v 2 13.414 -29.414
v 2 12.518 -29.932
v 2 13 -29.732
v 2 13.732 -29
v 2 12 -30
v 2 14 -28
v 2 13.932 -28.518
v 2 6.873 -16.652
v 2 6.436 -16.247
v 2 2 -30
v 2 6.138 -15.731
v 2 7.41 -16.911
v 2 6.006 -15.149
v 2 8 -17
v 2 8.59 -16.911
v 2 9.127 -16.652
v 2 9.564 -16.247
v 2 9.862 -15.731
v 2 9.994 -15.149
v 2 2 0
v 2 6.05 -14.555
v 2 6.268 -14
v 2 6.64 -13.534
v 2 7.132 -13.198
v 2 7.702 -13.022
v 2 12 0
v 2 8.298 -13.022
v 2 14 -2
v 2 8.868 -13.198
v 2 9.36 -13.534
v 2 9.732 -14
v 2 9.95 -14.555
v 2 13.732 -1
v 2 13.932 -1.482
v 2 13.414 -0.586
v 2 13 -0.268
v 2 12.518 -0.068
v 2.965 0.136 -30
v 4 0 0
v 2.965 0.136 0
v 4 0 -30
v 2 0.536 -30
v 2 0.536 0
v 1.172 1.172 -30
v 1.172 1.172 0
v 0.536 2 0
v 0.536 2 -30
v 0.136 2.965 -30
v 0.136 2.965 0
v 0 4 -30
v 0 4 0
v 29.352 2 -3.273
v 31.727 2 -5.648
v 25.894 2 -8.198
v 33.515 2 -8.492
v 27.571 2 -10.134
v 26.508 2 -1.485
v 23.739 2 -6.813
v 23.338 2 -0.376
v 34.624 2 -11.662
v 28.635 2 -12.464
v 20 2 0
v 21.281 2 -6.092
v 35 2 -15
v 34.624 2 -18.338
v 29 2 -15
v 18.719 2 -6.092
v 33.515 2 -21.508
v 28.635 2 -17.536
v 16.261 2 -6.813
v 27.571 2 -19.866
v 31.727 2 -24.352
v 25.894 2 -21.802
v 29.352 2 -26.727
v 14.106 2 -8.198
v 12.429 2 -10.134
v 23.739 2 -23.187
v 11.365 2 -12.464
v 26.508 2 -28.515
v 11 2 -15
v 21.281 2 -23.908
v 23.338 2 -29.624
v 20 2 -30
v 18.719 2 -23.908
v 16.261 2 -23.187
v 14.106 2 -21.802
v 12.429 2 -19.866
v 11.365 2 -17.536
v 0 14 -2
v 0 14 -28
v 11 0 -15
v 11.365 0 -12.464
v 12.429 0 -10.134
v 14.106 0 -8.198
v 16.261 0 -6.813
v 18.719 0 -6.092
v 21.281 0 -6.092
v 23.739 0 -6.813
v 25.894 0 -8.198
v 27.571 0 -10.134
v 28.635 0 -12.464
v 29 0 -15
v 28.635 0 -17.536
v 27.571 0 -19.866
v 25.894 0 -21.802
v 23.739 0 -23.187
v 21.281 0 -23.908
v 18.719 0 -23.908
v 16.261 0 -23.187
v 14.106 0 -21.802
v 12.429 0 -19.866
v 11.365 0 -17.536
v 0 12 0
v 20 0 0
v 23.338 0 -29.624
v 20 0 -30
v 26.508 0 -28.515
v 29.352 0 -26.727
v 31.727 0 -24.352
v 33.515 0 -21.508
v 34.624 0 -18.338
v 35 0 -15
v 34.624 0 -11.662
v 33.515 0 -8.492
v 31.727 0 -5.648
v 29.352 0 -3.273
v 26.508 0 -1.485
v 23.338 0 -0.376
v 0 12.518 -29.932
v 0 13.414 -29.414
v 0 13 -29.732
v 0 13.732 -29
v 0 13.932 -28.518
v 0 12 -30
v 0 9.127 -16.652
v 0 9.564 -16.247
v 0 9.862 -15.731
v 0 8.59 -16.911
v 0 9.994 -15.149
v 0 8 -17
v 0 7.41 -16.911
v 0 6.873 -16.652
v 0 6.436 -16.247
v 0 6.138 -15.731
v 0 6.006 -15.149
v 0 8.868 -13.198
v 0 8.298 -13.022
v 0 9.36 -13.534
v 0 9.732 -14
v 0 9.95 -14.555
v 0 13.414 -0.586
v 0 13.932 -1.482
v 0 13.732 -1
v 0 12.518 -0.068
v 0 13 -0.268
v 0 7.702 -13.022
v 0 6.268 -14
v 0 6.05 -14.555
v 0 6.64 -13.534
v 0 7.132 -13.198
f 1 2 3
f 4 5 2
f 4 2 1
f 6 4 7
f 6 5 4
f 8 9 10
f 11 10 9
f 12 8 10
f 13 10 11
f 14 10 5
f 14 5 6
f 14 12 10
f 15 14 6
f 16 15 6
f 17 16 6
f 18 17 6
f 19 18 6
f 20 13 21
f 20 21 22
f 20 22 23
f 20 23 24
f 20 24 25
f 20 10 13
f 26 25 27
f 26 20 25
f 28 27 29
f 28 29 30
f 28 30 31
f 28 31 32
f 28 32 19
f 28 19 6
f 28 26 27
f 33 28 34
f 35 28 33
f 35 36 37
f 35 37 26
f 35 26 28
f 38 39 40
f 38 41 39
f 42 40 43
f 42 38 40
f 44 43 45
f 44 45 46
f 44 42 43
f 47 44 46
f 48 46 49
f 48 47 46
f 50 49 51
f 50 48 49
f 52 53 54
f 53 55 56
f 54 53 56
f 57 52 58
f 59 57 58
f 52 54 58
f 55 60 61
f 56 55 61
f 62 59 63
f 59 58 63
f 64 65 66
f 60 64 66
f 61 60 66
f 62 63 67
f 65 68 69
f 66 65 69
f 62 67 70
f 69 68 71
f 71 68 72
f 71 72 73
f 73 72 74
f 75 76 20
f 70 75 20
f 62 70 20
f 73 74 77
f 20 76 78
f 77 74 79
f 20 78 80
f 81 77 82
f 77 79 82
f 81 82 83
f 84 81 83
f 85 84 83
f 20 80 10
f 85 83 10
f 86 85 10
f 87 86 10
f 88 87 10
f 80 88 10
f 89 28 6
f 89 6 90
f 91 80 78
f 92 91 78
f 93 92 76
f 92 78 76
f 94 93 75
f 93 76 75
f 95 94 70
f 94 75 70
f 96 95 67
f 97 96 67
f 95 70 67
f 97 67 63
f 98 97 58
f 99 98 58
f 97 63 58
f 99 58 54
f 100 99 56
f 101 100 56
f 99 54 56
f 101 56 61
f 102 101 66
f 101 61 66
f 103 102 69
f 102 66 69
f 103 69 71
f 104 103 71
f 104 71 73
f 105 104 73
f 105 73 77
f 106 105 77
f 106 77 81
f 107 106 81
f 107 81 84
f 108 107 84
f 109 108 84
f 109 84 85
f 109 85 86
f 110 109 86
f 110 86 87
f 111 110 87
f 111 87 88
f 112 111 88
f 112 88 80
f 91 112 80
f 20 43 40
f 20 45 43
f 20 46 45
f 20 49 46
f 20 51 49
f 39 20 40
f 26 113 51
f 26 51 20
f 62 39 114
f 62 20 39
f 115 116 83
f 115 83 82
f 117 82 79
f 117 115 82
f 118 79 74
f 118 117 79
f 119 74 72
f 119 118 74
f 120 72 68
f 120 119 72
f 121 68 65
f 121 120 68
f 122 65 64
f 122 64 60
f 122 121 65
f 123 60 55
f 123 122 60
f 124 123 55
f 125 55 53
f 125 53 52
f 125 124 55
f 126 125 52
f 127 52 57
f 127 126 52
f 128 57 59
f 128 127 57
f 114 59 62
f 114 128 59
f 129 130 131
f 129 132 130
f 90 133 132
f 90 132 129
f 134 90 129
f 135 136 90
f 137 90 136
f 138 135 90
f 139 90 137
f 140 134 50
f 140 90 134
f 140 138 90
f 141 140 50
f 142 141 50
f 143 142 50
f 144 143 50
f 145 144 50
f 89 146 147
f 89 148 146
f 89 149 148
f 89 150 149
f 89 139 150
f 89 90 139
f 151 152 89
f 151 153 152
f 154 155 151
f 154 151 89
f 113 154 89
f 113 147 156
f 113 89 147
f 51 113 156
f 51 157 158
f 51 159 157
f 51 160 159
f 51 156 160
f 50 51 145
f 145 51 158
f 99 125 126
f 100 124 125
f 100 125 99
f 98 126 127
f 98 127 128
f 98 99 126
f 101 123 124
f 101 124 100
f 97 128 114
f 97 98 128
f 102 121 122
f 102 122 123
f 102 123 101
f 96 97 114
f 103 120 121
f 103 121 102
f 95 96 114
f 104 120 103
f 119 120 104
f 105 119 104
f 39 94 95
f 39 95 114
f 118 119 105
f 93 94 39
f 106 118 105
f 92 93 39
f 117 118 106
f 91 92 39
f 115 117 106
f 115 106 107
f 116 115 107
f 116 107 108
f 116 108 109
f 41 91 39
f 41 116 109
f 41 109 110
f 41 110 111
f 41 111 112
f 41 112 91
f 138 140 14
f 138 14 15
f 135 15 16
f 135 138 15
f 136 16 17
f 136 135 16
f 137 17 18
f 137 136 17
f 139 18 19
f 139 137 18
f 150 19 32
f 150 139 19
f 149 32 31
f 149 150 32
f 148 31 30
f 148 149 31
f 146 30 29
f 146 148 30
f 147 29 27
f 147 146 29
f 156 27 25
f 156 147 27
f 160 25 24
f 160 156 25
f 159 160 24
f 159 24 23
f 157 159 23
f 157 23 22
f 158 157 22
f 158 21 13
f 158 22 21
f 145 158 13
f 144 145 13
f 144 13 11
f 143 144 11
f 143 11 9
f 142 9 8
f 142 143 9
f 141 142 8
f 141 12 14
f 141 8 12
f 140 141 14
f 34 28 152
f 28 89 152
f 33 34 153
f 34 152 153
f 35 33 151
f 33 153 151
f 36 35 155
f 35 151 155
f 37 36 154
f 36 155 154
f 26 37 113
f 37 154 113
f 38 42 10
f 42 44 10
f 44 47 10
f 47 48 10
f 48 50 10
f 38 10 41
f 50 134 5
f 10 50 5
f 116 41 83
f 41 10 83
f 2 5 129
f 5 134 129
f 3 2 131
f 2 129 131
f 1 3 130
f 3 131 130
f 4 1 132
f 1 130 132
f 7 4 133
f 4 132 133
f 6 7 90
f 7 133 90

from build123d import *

# Parameters (mm, degrees)
BOSS_EXTRUDE1_DEPTH     = 30
EXTRUDE_THIN1_DEPTH     = 2
SKETCH3_R               = 9
CUT_EXTRUDE1_DEPTH      = 48.634021455
FILLET2_R               = 4
CUT_EXTRUDE2_DEPTH      = 49.176757882
CUT_EXTRUDE2_DEPTH_BACK = 49.176757882
SKETCH4_R               = 2
FILLET3_R               = 2


with BuildPart() as part:
    # Sketch1 → Boss-Extrude1 (new body)
    with BuildSketch(Plane.XY):
        Polygon((0, 0), (20, 0), (20, 2), (2, 2), (2, 14), (0, 14), align=None)
    extrude(amount=-BOSS_EXTRUDE1_DEPTH)

    # Sketch2 → Extrude-Thin1 (add)
    with BuildSketch(Plane(origin=(0, 0, 0), x_dir=(1, 0, 0), z_dir=(0, 1, 0))):
        with BuildLine():
            ThreePointArc((20, 30), (35, 15), (20, 0))
            Line((20, 0), (20, 10))
            ThreePointArc((20, 10), (25, 15), (20, 20))
            Line((20, 20), (20, 30))
        make_face()
    extrude(amount=EXTRUDE_THIN1_DEPTH)

    # Sketch3 → Cut-Extrude1 (cut, through all)
    with BuildSketch(Plane(origin=(0, 2, 0), x_dir=(1, 0, 0), z_dir=(0, 1, 0))):
        with Locations(Location((20, 15, 0), (0, 0, 180))):
            Circle(SKETCH3_R)
    extrude(amount=-CUT_EXTRUDE1_DEPTH, mode=Mode.SUBTRACT)

    # Fillet2
    fillet2_edges = [part.edges().sort_by_distance(p)[0] for p in [
        (0, 0, -15),
    ]]
    fillet(fillet2_edges, radius=FILLET2_R)

    # Sketch4 → Cut-Extrude2 (cut, two sides: drawn at the far end of the back side and taken through both)
    with BuildSketch(Plane(origin=(0, 0, 0), x_dir=(0, 0, -1), z_dir=(1, 0, 0)).offset(-CUT_EXTRUDE2_DEPTH_BACK)):
        with Locations((15, 8)):
            Circle(SKETCH4_R)
    extrude(amount=CUT_EXTRUDE2_DEPTH + CUT_EXTRUDE2_DEPTH_BACK, mode=Mode.SUBTRACT)

    # Fillet3
    fillet3_edges = [part.edges().sort_by_distance(p)[0] for p in [
        (1, 14, -30),
        (1, 14, 0),
    ]]
    fillet(fillet3_edges, radius=FILLET3_R)


solid = part.part
